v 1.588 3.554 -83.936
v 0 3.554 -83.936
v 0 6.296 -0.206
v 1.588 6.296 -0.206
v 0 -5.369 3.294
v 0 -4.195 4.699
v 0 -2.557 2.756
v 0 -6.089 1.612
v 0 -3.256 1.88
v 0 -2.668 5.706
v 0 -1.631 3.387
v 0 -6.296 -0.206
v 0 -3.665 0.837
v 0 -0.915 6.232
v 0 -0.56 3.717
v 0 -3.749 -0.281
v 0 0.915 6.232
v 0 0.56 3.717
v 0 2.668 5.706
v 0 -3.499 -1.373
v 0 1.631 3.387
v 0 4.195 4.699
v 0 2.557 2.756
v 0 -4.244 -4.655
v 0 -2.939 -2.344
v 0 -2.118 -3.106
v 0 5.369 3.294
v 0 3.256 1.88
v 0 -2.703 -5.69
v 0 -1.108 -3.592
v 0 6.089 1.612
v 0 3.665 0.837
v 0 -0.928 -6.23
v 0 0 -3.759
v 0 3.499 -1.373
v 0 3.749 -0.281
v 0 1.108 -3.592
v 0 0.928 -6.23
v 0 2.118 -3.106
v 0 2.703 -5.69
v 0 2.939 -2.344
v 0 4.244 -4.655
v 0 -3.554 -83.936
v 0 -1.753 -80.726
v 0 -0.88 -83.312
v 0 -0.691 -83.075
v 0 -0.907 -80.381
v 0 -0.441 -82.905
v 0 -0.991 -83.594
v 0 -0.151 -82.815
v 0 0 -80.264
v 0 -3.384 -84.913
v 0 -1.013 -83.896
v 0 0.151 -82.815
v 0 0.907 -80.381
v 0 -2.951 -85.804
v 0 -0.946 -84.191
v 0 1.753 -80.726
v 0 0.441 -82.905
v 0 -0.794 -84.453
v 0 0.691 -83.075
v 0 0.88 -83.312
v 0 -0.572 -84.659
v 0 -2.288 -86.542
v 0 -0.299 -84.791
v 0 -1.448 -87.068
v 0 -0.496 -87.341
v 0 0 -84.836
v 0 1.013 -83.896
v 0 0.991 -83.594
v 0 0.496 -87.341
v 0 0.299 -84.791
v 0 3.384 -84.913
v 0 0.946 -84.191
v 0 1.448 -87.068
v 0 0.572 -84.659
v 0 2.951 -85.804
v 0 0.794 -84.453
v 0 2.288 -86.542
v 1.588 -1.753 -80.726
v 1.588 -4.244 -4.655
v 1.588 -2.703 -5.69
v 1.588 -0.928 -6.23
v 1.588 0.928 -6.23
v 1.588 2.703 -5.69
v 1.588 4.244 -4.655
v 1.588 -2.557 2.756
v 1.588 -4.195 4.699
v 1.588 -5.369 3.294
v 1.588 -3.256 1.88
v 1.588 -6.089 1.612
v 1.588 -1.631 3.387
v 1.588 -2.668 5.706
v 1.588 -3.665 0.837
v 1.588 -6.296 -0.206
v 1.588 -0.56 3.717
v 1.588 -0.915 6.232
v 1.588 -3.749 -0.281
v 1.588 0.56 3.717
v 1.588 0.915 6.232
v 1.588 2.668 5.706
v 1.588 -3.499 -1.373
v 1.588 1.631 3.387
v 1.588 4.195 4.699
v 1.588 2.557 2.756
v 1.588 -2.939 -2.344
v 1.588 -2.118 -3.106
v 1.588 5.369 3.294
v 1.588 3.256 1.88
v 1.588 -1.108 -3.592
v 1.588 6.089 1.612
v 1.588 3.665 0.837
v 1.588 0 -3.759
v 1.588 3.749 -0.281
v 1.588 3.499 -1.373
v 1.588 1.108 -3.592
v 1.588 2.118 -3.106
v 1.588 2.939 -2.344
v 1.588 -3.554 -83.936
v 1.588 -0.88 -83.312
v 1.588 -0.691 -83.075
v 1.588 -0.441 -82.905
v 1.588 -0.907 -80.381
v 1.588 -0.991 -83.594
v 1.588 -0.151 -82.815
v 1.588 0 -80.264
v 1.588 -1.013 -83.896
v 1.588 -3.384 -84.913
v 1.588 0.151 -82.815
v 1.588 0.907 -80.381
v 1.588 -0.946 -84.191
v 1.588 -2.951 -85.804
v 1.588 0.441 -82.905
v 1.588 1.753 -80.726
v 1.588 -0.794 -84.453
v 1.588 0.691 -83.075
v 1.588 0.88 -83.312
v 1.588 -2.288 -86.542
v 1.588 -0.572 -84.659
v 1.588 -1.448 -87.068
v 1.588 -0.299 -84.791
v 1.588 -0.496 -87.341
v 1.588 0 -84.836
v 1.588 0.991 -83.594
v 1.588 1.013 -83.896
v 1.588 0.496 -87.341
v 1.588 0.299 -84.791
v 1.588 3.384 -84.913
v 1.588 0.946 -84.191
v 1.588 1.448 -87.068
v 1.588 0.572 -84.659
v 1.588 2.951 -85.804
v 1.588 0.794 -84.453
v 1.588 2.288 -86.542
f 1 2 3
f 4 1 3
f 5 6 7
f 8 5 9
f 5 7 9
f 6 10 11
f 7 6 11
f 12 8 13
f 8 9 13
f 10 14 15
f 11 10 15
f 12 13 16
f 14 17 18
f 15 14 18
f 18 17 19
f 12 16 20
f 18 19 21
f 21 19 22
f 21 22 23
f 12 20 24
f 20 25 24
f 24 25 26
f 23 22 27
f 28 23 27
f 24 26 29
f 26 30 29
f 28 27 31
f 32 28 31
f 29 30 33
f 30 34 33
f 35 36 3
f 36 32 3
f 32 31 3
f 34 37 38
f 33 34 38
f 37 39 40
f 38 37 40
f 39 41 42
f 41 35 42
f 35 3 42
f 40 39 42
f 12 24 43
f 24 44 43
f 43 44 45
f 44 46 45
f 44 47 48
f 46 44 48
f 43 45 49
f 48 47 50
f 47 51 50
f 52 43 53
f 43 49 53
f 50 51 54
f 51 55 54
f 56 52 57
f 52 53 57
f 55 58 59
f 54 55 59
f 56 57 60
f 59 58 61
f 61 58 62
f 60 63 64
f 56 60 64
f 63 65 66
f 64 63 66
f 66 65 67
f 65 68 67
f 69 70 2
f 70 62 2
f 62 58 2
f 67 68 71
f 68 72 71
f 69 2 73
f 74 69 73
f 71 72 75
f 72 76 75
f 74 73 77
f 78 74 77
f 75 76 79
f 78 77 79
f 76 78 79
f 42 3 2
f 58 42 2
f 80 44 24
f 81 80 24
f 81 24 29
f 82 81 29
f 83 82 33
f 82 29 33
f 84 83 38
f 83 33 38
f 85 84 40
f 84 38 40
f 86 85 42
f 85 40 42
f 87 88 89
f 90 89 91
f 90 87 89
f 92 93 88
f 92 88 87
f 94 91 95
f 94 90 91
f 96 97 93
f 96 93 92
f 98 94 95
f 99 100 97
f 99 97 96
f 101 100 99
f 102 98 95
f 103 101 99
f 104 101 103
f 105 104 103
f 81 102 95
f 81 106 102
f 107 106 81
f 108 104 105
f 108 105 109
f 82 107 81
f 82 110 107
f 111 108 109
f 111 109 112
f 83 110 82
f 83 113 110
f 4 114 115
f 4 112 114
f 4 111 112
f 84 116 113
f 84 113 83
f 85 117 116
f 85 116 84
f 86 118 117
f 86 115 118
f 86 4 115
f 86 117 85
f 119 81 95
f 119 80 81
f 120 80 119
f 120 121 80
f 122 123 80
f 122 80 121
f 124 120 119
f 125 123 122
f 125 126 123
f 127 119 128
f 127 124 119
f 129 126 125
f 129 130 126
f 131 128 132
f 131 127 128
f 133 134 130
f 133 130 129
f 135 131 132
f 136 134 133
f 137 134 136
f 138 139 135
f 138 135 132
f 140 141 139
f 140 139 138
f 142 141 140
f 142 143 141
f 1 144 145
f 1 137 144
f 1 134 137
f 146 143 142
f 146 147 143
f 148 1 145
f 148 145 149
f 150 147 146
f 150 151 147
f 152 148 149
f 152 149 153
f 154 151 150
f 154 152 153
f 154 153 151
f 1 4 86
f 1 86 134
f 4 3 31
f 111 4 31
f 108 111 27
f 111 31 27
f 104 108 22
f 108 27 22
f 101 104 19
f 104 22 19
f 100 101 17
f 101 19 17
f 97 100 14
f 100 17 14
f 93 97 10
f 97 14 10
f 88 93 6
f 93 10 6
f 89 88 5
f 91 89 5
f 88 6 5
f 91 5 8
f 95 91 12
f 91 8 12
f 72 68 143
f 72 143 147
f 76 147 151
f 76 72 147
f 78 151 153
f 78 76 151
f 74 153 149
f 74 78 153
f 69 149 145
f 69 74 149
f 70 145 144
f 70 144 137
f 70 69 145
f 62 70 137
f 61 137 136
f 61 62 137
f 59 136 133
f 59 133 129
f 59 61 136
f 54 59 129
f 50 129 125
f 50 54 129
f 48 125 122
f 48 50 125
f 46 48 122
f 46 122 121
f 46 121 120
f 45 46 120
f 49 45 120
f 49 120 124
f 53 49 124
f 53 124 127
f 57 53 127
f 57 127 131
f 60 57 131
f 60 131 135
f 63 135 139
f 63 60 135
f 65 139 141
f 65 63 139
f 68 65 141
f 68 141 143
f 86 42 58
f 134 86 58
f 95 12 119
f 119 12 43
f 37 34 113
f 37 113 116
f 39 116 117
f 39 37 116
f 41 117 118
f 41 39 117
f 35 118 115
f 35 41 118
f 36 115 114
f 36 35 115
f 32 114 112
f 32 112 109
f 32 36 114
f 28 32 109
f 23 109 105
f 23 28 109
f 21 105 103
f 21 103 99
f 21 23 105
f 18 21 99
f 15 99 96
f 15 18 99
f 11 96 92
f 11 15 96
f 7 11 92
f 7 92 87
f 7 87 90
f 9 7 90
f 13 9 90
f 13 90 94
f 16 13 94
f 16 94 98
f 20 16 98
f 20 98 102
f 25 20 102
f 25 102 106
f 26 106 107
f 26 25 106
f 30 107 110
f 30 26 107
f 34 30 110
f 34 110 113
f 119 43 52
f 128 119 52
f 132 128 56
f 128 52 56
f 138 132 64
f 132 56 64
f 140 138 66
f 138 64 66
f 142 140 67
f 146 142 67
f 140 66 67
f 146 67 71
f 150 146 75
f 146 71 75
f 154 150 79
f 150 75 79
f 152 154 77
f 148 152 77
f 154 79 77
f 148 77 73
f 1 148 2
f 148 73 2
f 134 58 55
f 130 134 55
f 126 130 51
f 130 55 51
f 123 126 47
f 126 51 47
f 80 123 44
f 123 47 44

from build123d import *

# Parameters (mm, degrees)
SKETCH1_R           = 1.016
SKETCH1_R_2         = 3.7592
BOSS_EXTRUDE1_DEPTH = 1.5875


with BuildPart() as part:
    # Sketch1 → Boss-Extrude1 (new body)
    with BuildSketch(Plane(origin=(0, 0, 0), x_dir=(0, 0, -1), z_dir=(1, 0, 0))):
        with BuildLine():
            Line((83.936378182, 3.55409512), (0.206155636, 6.29582564))
            ThreePointArc((0.206155636, 6.29582564), (-6.2992, 9e-09), (0.206155618, -6.295825641))
            Line((0.206155618, -6.295825641), (83.936378182, -3.55409512))
            ThreePointArc((83.936378182, -3.55409512), (87.376, 0), (83.936378182, 3.55409512))
        make_face()
        with BuildLine():
            ThreePointArc((4.654808766, -4.244134305), (6.2992, 0), (4.654808766, 4.244134305))
            Line((4.654808766, 4.244134305), (80.726222273, 1.753190057))
            ThreePointArc((80.726222273, 1.753190057), (80.264, 0), (80.726222273, -1.753190057))
            Line((80.726222273, -1.753190057), (4.654808766, -4.244134305))
        make_face(mode=Mode.SUBTRACT)
        with Locations((83.82, 0)):
            Circle(SKETCH1_R, mode=Mode.SUBTRACT)
        Circle(SKETCH1_R_2, mode=Mode.SUBTRACT)
    extrude(amount=BOSS_EXTRUDE1_DEPTH)


solid = part.part
